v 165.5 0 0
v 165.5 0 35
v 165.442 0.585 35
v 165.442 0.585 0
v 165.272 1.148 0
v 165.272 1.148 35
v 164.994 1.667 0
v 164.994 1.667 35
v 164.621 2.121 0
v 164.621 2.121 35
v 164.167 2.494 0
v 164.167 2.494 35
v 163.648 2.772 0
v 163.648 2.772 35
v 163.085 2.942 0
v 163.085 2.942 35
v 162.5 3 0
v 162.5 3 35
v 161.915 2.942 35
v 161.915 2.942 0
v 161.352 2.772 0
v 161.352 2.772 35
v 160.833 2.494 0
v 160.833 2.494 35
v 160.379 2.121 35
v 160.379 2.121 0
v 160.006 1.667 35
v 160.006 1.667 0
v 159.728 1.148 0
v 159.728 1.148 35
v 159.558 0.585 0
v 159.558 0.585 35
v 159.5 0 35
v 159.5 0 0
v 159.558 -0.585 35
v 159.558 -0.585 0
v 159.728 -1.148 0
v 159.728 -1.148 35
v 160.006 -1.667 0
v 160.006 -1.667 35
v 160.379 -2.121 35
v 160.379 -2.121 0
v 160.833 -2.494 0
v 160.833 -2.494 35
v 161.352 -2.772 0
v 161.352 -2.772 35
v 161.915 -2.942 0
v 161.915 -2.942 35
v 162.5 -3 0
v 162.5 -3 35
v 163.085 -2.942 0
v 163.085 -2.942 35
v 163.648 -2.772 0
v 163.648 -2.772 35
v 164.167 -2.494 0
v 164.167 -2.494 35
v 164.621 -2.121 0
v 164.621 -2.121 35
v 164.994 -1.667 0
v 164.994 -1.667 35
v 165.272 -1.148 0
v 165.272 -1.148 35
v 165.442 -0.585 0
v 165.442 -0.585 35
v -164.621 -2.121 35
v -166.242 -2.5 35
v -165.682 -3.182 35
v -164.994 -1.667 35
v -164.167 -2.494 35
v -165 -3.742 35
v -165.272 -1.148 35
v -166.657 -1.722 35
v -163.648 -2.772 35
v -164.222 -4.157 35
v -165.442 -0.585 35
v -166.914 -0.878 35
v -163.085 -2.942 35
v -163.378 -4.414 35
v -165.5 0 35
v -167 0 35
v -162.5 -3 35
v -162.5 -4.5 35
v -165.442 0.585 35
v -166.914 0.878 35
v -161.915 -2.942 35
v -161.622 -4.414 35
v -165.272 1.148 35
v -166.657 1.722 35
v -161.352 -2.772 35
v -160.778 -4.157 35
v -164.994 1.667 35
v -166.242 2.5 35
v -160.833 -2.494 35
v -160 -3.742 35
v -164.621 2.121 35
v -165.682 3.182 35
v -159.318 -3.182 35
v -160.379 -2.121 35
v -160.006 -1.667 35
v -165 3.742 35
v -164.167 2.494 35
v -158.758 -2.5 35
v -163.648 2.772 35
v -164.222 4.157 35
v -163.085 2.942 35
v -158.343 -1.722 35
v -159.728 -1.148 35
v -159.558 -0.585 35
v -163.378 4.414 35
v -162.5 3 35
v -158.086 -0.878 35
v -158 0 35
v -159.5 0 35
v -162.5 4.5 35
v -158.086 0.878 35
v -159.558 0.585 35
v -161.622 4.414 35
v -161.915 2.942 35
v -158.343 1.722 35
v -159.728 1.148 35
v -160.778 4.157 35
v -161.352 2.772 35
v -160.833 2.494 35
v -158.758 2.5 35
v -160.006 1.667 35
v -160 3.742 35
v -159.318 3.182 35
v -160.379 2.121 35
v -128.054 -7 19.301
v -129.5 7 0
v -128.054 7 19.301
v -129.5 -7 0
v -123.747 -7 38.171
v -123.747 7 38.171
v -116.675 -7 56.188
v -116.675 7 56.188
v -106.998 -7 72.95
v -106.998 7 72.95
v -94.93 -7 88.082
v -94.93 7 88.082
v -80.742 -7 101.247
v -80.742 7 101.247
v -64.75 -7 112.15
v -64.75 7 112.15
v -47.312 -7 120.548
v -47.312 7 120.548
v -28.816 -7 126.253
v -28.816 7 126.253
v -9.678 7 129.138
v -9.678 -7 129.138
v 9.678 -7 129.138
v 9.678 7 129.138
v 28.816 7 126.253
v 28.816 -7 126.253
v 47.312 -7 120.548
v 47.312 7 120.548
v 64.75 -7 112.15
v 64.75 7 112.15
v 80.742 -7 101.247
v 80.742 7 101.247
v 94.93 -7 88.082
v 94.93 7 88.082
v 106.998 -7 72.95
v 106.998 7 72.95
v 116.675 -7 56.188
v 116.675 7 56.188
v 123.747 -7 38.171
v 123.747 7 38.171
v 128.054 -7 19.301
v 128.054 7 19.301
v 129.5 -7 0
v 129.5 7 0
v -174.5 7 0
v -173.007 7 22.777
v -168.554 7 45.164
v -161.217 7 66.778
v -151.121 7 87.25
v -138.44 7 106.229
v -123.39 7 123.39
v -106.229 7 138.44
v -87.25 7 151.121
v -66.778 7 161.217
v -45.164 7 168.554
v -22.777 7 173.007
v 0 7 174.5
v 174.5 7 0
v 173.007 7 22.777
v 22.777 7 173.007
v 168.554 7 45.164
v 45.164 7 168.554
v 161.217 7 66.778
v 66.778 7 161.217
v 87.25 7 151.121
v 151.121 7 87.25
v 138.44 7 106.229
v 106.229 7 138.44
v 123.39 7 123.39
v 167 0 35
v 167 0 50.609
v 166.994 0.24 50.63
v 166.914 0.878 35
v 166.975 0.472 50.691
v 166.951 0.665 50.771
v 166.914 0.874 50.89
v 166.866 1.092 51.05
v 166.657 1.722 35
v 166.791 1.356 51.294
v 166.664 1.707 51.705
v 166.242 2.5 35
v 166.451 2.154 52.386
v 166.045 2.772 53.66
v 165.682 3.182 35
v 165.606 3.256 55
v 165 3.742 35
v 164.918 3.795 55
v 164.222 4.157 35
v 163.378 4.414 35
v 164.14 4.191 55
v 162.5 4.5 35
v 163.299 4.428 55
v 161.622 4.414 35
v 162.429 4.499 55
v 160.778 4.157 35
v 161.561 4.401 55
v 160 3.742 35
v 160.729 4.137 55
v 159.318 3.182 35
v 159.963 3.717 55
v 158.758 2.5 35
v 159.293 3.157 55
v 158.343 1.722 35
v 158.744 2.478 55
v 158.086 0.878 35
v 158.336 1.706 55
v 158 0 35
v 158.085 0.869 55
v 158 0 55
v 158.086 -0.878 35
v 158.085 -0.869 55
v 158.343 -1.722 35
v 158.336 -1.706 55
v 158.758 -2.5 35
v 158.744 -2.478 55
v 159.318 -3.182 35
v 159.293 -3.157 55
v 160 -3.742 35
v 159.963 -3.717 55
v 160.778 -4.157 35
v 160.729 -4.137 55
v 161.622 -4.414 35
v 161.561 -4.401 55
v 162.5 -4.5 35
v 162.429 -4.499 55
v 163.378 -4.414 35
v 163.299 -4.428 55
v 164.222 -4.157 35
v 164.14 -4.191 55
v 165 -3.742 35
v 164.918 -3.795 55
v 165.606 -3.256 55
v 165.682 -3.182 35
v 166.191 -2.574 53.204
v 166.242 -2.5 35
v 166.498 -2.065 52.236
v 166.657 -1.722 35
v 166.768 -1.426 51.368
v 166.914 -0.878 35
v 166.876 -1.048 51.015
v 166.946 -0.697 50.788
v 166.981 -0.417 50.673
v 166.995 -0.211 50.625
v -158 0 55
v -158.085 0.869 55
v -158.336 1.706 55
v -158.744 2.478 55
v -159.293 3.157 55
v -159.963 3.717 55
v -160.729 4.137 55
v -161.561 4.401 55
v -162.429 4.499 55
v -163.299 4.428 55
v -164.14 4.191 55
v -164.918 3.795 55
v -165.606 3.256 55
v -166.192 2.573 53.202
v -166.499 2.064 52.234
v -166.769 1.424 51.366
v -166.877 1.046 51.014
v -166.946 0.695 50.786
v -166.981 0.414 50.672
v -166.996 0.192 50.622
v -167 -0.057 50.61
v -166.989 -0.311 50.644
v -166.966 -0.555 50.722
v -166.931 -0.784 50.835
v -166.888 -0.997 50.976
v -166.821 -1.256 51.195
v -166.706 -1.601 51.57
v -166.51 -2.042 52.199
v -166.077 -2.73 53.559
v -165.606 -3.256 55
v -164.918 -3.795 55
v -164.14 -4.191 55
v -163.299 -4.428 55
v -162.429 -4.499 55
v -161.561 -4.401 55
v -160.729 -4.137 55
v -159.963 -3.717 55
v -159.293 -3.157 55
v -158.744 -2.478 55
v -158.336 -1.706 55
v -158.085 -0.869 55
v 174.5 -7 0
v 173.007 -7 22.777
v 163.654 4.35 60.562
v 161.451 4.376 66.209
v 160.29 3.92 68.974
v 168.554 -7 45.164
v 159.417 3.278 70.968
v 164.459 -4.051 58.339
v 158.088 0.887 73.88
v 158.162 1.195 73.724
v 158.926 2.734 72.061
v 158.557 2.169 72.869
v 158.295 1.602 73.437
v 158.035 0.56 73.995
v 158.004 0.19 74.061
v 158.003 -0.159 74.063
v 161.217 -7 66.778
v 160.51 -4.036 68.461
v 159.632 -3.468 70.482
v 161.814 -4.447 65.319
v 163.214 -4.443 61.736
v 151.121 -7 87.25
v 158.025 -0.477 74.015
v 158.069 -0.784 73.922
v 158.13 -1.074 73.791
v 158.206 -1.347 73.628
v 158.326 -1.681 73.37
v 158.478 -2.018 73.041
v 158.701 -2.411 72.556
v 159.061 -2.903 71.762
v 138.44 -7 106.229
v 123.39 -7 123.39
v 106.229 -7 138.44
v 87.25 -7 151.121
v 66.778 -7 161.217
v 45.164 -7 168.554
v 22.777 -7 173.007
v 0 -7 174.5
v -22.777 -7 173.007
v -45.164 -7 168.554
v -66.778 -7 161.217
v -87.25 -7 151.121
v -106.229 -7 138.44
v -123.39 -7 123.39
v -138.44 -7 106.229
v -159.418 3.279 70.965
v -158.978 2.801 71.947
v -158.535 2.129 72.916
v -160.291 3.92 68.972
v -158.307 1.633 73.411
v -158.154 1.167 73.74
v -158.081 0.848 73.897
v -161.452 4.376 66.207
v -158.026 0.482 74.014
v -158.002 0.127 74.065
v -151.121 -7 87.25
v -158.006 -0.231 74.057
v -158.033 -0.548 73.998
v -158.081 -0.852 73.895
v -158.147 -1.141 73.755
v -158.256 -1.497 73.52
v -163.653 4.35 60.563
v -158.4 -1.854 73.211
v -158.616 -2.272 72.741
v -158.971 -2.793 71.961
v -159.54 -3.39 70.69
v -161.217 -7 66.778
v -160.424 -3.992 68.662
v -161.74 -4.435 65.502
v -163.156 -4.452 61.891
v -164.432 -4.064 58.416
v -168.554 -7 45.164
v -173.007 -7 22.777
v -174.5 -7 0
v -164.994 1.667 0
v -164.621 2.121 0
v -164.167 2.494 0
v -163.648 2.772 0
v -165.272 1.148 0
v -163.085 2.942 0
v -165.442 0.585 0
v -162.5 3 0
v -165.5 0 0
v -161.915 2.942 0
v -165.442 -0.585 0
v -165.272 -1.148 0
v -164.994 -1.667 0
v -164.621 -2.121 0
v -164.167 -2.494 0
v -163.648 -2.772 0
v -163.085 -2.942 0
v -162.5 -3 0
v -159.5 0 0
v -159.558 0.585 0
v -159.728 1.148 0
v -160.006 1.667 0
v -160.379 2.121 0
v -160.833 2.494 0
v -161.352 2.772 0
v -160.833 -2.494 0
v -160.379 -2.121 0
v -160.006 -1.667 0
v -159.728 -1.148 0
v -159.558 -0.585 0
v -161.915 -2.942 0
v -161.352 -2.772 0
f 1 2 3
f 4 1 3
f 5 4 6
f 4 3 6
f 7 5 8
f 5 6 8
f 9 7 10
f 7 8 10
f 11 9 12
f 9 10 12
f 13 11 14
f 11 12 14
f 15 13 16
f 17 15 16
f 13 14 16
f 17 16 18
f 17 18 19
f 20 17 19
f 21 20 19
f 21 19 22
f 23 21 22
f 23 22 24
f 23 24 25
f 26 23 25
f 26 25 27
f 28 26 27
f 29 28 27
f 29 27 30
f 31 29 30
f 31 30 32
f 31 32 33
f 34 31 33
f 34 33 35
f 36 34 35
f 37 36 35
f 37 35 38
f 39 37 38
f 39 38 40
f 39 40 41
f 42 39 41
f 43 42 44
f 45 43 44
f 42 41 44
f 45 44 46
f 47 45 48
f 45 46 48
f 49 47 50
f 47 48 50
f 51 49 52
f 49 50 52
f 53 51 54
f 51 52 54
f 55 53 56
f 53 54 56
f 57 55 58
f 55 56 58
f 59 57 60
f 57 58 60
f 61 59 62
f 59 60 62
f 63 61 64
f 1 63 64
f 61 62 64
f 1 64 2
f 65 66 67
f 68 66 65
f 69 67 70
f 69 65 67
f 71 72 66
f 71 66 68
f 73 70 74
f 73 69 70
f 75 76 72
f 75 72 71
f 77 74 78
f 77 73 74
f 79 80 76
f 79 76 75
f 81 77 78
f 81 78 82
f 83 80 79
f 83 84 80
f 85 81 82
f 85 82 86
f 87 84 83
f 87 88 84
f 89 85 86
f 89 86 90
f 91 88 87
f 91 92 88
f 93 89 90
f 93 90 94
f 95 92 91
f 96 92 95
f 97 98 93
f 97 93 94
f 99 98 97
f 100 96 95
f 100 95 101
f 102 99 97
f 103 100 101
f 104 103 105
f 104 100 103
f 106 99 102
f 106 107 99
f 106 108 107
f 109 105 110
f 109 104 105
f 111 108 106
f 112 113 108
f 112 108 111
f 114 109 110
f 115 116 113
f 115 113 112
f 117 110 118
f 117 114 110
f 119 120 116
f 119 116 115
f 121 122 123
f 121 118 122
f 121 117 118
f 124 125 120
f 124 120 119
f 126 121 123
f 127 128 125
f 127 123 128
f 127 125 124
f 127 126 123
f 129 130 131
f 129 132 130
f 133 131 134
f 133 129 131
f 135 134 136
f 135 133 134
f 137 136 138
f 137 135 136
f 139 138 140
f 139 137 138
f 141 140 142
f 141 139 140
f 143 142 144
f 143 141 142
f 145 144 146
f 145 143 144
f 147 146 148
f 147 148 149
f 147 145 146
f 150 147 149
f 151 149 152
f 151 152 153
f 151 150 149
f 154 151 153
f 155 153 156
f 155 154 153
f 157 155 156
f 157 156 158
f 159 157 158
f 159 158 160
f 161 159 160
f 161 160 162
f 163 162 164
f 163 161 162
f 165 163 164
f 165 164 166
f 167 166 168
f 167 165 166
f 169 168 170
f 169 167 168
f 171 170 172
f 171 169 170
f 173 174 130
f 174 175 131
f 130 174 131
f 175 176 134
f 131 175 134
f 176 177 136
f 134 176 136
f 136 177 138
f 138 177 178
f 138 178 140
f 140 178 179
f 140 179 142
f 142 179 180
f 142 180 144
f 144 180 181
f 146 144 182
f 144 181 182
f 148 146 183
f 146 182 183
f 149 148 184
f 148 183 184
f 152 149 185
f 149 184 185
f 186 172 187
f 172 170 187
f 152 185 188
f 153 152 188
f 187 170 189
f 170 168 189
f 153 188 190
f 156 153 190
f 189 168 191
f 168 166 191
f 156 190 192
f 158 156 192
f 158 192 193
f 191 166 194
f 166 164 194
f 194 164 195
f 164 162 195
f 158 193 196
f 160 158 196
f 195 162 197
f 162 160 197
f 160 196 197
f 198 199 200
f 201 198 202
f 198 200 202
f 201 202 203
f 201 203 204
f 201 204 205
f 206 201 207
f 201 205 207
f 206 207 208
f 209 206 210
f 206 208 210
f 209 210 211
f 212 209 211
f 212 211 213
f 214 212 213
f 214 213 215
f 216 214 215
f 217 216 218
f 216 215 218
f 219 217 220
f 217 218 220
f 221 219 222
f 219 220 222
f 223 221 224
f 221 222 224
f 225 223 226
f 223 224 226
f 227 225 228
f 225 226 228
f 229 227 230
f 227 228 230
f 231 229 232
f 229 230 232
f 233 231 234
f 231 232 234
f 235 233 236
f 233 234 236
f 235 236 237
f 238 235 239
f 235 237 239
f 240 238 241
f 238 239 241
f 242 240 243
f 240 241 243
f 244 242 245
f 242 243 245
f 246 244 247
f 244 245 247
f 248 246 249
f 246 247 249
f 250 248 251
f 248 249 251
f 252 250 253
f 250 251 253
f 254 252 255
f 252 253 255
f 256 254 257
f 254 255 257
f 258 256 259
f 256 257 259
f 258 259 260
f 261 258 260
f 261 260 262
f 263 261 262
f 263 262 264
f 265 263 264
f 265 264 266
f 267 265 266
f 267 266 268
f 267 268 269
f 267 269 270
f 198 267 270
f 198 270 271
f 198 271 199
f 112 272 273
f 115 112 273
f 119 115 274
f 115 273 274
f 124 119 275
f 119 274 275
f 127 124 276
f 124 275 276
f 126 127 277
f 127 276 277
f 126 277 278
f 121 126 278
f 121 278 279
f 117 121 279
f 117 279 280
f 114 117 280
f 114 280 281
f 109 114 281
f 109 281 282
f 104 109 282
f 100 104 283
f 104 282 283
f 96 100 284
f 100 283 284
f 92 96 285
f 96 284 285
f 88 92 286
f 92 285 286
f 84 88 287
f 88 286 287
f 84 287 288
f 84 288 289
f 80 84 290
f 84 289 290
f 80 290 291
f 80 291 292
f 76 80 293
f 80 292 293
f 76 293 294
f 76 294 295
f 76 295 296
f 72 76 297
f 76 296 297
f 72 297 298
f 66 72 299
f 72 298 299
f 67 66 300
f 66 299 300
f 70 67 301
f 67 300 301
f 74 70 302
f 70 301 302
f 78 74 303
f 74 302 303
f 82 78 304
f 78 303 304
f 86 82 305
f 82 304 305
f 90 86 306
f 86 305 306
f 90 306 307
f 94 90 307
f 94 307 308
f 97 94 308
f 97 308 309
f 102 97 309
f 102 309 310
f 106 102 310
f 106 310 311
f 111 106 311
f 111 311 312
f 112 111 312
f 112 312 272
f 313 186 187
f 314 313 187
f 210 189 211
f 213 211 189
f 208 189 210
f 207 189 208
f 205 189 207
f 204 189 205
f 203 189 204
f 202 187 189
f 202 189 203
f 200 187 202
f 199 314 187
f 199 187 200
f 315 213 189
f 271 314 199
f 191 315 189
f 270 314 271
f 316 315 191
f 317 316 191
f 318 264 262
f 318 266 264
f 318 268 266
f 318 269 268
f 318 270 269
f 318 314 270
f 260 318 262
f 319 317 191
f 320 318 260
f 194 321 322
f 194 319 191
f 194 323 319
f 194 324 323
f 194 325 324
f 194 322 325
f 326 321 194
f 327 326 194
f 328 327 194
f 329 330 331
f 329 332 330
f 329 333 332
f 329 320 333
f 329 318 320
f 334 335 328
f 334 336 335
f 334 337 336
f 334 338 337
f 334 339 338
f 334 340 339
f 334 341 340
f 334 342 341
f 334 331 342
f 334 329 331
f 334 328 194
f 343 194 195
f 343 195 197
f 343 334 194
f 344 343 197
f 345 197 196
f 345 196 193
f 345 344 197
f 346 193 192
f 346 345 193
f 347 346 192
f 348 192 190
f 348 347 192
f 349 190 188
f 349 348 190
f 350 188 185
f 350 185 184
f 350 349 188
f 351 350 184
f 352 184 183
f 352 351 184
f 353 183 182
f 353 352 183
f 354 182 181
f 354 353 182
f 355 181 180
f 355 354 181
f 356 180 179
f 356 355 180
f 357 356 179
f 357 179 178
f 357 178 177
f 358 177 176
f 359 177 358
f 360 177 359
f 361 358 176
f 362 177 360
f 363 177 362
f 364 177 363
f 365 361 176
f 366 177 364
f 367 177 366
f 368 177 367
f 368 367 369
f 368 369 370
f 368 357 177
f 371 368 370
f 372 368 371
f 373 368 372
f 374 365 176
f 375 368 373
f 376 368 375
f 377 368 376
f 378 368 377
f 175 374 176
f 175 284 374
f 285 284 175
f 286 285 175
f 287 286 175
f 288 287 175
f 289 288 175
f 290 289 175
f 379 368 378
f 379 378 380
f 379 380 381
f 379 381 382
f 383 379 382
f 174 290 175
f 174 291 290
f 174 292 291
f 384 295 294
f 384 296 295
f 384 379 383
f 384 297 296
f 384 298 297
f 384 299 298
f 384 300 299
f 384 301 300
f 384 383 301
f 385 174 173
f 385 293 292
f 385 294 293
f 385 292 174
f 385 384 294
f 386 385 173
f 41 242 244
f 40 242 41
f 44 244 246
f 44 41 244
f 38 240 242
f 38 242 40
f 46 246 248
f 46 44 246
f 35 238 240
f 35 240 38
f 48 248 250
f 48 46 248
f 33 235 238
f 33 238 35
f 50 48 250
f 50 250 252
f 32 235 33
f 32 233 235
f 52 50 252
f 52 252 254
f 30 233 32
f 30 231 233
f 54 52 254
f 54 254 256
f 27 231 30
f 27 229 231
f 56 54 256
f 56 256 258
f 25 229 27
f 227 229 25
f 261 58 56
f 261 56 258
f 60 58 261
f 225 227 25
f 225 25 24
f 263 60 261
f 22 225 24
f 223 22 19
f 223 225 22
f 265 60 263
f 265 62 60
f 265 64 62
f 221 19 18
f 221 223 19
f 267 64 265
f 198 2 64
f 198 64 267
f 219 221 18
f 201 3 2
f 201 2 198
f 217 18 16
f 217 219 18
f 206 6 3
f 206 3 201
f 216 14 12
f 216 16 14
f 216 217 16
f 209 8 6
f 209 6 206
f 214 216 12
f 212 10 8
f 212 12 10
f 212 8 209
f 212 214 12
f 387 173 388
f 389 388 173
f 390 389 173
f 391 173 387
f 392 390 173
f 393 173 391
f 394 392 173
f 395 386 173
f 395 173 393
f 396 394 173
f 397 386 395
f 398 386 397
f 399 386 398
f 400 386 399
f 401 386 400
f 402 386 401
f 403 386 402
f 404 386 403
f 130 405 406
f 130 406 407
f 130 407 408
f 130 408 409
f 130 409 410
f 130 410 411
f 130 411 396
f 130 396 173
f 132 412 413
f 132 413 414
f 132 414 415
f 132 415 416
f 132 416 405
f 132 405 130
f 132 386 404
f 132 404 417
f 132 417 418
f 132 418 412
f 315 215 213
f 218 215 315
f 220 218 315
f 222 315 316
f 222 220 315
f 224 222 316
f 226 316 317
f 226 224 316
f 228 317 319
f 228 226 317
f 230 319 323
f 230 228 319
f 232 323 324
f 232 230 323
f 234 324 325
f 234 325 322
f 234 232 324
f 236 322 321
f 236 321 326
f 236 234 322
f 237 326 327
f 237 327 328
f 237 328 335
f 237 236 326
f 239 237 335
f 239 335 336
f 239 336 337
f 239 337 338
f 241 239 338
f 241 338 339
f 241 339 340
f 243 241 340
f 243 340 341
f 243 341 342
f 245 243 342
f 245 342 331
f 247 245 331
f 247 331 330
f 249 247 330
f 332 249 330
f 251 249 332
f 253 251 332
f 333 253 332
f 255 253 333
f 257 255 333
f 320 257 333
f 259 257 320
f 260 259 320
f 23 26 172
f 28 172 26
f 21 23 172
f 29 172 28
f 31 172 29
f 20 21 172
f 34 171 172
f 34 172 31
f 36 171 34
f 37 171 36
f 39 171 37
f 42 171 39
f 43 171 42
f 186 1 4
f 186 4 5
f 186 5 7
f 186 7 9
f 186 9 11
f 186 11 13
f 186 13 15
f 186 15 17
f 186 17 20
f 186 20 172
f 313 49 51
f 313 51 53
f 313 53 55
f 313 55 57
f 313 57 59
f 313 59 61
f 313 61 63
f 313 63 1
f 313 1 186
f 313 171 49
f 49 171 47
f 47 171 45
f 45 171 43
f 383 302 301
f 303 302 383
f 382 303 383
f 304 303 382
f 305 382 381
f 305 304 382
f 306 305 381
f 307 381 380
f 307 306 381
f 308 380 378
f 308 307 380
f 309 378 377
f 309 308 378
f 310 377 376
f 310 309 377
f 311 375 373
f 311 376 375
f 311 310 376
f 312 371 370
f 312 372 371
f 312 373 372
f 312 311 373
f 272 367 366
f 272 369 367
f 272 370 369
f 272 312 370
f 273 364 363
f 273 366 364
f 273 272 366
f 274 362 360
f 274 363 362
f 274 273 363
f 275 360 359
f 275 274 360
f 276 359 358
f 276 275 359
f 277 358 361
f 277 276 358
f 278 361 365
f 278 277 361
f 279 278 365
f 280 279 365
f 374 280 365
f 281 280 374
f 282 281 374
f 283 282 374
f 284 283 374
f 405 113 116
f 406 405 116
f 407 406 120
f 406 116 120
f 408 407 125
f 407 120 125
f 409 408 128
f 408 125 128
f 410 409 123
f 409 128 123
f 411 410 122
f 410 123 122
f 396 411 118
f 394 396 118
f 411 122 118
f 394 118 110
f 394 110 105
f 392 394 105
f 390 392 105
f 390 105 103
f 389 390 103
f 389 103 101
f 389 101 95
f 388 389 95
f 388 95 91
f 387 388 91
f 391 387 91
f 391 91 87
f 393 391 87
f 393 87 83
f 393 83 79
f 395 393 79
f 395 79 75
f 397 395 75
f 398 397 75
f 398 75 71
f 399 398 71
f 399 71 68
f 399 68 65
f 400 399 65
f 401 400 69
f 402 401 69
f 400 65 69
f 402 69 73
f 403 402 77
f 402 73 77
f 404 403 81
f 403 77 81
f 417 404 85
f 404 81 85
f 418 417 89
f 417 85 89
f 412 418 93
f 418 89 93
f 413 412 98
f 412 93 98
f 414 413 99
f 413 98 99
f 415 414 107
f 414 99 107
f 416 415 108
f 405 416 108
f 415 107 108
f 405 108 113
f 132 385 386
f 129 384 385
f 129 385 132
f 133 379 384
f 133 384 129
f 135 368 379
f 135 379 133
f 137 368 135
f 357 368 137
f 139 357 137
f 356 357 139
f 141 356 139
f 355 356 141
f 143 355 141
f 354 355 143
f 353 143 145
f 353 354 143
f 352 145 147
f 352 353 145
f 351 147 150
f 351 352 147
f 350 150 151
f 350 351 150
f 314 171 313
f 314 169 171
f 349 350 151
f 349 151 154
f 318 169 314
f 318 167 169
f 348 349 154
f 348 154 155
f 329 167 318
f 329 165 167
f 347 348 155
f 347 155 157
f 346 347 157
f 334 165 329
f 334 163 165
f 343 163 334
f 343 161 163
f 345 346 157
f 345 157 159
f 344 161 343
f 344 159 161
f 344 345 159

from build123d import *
from build123d import SkipClean  # not in build123d's __all__

# Parameters (mm, degrees)
F1_DEPTH = 7
F2_DEPTH = 6
F4_R     = 4.5
F5_DEPTH = 119.501
F6_DEPTH = 20
F7_R     = 3
F8_DEPTH = 35.0010001


# Not quite as in the source:
# - after a boolean that leaves OpenCascade's solid faulty, fix() repairs it


with BuildPart() as f1:
    # F0 (on Front) → F1 (new body, symmetric)
    with BuildSketch(Plane.XZ):
        with BuildLine():
            Line((129.5, 0), (174.5, 0))
            ThreePointArc((174.5, 0), (0, 174.5), (-174.5, 0))
            Line((-174.5, 0), (-129.5, 0))
            ThreePointArc((-129.5, 0), (0, 129.5), (129.5, 0))
        make_face()
    extrude(amount=F1_DEPTH, both=True)

    # F0 (on Front) → F2 (join, symmetric)
    with BuildSketch(Plane.XZ):
        with BuildLine():
            Line((129.5, 0), (174.5, 0))
            ThreePointArc((174.5, 0), (0, 174.5), (-174.5, 0))
            Line((-174.5, 0), (-129.5, 0))
            ThreePointArc((-129.5, 0), (0, 129.5), (129.5, 0))
        make_face()
    extrude(amount=F2_DEPTH, both=True)

    # F4 (on offset) → F5 (cut, through all)
    with BuildSketch(Plane.XY.offset(55)):
        with Locations((-162.5, 0)):
            Circle(F4_R)
        with Locations((162.5, 0)):
            Circle(F4_R)
    extrude(amount=F5_DEPTH, mode=Mode.SUBTRACT)

    # F4 (on offset) → F6 (cut)
    with BuildSketch(Plane.XY.offset(55)):
        with Locations((-162.5, 0)):
            Circle(F4_R)
        with Locations((162.5, 0)):
            Circle(F4_R)
    with SkipClean():  # cleaning this boolean's faces spoils the solid; the shape is the same uncleaned
        extrude(amount=-F6_DEPTH, mode=Mode.SUBTRACT)

    # F7 (on face) → F8 (cut, through all)
    with BuildSketch(Plane.XY.offset(35)):
        with Locations((-162.5, 0)):
            Circle(F7_R)
        with Locations((162.5, 0)):
            Circle(F7_R)
    extrude(amount=-F8_DEPTH, mode=Mode.SUBTRACT)

    add(f1.part.fix(), mode=Mode.REPLACE)


solid = f1.part
